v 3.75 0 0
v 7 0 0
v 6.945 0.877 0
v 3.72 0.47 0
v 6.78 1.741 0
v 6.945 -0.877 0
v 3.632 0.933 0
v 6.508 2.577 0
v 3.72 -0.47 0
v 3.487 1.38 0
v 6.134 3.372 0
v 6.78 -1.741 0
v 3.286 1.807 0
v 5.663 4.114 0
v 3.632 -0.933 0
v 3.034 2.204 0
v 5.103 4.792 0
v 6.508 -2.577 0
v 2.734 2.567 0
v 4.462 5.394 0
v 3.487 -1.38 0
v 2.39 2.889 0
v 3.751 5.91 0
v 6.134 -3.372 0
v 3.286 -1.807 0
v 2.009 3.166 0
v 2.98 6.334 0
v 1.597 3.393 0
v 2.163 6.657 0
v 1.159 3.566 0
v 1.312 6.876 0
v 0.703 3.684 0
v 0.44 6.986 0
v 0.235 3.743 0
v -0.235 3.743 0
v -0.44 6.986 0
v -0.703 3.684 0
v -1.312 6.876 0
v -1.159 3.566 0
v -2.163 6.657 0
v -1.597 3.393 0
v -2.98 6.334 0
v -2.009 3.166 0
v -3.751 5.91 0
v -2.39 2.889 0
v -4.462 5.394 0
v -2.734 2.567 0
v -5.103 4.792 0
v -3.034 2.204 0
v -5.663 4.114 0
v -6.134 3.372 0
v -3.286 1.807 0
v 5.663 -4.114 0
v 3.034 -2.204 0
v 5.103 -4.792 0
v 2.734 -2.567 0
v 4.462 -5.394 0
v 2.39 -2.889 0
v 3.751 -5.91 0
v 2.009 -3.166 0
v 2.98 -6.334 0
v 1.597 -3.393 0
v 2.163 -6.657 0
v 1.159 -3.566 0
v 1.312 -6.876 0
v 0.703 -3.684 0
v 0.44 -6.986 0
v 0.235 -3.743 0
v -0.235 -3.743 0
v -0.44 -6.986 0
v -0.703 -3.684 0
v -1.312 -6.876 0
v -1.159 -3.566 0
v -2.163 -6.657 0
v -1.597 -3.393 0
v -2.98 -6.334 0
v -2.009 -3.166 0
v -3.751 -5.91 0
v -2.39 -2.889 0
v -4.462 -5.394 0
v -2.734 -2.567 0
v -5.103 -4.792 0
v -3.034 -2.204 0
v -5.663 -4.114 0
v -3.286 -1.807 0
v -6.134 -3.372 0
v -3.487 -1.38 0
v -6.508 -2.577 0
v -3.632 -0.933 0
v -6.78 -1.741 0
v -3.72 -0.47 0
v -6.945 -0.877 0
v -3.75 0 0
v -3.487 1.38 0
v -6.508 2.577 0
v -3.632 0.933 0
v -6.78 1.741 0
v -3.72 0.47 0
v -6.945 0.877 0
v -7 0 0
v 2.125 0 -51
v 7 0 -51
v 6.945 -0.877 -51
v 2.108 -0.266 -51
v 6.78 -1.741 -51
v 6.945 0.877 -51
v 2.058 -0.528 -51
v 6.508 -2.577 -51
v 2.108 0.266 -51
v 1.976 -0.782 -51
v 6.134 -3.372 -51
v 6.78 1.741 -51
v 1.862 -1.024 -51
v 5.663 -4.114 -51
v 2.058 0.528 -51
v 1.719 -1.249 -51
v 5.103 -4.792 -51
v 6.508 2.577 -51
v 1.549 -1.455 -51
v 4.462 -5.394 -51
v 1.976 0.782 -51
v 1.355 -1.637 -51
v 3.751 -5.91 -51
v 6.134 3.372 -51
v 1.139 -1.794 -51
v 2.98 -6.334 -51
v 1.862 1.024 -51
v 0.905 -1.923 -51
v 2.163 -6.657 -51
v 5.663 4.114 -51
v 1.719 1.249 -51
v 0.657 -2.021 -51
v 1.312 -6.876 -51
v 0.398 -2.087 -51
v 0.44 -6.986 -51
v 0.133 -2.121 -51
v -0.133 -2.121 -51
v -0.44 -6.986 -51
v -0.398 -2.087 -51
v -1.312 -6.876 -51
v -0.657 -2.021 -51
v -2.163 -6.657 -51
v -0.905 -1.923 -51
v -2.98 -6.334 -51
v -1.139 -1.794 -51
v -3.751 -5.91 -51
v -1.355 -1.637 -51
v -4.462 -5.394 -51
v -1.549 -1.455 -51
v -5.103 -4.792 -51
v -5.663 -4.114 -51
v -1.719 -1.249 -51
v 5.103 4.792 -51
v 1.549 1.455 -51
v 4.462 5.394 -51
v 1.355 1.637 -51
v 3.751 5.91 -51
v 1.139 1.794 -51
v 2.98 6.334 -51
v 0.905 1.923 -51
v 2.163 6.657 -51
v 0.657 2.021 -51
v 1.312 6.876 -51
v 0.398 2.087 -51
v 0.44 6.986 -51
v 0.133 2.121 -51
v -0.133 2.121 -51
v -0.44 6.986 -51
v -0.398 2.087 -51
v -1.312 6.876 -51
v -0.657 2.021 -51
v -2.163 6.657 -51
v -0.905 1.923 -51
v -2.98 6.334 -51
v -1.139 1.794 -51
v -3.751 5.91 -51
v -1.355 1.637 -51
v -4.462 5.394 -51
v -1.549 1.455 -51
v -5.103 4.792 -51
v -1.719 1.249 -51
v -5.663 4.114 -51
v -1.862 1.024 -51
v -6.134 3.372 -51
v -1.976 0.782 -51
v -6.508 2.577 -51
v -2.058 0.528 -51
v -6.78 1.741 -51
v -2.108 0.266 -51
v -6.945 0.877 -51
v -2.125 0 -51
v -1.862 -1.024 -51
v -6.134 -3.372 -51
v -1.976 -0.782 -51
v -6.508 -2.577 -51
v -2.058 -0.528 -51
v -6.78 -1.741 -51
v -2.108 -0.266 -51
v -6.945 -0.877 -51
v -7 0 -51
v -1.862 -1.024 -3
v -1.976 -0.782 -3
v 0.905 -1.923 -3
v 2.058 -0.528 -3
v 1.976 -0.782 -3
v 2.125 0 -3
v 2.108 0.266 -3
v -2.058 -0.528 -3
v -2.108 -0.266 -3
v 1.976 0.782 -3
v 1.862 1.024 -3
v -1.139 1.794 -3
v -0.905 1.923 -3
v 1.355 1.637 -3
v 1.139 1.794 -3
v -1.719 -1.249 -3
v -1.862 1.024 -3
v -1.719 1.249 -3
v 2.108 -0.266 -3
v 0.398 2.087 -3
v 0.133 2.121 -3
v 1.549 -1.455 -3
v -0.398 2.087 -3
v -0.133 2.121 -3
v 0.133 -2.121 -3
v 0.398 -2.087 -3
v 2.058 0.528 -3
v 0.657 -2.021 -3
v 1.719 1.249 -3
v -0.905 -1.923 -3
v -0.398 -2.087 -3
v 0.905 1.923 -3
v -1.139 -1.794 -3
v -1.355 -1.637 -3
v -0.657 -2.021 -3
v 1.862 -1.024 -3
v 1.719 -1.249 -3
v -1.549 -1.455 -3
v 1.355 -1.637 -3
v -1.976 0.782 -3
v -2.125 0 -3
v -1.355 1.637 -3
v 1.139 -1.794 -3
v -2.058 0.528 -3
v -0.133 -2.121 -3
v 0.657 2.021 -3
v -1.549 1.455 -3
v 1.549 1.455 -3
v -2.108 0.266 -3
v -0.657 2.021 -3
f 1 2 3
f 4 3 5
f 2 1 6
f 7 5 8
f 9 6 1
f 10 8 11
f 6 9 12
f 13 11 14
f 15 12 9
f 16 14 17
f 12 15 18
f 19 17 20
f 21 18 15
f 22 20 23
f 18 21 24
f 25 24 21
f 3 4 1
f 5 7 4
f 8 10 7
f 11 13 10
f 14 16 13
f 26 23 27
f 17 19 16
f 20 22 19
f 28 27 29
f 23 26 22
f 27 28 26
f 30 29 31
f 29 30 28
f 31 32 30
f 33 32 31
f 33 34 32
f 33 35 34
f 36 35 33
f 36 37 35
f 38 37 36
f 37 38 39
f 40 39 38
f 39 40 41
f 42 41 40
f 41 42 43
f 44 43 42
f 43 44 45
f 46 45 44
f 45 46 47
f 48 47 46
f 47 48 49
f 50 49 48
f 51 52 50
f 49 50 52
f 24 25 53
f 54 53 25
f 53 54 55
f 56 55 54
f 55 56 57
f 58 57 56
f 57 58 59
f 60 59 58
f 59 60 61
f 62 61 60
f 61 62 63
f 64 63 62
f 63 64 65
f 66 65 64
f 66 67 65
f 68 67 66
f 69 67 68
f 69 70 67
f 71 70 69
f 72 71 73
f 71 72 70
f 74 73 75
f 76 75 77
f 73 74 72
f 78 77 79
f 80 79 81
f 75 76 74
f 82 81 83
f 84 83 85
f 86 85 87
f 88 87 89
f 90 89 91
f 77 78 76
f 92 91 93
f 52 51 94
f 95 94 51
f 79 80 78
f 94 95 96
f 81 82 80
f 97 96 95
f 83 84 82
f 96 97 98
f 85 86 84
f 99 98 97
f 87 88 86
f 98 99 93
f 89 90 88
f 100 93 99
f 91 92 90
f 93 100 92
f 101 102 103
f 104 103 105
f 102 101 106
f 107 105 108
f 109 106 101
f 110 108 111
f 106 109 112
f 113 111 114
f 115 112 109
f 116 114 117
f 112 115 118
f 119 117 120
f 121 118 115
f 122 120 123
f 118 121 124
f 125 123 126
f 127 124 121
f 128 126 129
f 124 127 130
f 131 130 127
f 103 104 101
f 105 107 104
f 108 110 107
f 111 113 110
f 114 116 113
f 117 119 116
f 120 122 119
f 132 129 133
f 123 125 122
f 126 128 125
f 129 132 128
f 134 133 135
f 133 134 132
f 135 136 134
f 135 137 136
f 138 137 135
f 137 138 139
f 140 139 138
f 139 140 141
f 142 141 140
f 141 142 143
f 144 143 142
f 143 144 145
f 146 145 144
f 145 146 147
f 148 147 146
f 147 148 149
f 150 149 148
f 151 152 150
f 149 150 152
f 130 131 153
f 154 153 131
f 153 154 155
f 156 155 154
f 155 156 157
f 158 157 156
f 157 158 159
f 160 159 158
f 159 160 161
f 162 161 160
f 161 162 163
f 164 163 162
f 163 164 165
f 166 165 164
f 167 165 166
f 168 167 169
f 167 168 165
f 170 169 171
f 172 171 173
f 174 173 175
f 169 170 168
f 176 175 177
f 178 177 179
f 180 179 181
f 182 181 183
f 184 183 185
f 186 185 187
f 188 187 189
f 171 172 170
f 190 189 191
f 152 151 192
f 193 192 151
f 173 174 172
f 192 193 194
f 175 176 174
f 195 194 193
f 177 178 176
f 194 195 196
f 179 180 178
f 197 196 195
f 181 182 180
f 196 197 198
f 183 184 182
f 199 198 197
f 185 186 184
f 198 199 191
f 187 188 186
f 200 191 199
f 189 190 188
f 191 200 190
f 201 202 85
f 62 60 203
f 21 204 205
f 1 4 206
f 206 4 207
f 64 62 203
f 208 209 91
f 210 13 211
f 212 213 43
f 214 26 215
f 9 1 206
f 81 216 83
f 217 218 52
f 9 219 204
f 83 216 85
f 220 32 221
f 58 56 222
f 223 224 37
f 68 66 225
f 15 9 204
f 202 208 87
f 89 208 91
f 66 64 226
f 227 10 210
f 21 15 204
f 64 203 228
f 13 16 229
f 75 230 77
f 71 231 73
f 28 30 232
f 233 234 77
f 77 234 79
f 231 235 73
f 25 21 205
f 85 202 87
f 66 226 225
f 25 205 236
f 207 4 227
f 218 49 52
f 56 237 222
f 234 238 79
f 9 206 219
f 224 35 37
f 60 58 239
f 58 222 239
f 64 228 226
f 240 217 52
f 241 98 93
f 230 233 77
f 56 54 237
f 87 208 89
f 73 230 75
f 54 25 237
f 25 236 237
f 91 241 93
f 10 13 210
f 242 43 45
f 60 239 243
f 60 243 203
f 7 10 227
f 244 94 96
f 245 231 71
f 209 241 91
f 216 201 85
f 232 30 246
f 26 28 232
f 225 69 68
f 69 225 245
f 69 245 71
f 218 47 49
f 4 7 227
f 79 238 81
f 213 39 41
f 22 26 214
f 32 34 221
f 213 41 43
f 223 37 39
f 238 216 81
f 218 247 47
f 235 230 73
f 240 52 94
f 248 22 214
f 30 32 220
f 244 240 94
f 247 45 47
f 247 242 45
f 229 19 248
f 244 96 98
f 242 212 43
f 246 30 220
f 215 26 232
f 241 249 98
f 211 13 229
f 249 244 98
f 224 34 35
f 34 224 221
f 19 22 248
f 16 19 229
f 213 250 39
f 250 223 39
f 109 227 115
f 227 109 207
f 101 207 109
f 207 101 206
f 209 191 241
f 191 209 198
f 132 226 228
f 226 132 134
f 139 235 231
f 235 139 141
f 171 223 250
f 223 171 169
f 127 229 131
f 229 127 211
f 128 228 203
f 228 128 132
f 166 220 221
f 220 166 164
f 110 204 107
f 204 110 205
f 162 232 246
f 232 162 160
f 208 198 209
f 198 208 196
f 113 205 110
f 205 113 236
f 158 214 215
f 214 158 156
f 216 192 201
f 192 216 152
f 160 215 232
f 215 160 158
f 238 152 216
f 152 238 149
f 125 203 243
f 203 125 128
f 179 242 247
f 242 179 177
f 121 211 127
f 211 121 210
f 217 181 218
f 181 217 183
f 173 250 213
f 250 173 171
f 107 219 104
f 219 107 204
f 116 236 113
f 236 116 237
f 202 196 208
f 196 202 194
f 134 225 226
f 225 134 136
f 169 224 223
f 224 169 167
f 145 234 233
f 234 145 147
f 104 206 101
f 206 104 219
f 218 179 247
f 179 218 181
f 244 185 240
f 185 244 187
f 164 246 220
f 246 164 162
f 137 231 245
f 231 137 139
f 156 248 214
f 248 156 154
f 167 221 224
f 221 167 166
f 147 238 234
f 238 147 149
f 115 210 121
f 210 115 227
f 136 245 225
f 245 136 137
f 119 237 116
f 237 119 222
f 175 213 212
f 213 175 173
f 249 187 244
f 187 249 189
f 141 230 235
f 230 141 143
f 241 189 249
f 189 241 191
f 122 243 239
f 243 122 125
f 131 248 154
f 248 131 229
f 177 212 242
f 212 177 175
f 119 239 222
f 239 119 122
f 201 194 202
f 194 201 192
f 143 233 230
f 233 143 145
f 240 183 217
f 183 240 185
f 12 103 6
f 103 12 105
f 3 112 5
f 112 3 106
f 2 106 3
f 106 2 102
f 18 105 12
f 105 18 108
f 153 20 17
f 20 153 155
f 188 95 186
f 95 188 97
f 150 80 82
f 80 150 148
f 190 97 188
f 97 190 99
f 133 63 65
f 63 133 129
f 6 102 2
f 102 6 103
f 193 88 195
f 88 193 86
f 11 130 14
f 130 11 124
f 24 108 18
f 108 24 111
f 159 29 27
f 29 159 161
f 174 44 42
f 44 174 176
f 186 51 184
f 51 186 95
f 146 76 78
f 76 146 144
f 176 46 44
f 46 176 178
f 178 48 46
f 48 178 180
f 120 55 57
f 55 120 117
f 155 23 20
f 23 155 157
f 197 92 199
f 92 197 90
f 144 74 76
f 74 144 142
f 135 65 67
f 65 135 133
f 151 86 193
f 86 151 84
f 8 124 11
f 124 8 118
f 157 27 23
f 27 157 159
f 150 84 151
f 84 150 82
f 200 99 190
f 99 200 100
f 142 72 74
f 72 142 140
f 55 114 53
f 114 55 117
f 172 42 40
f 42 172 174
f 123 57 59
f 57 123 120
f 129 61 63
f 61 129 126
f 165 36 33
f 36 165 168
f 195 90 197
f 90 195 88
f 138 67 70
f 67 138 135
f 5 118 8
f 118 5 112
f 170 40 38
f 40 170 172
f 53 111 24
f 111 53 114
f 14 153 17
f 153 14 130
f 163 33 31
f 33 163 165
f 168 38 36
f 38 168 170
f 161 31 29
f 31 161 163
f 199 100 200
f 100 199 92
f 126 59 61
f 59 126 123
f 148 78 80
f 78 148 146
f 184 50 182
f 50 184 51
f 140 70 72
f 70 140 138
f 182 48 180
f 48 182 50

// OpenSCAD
$fn = 50;


difference() {
	union() {
		translate(v = [0, 0, -51.0000000000]) {
			cylinder(h = 51, r = 7.0000000000);
		}
		cylinder(h = 0, r = 13.0000000000);
	}
	union() {
		translate(v = [0, 0, 0]) {
			rotate(a = [0, 0, 0]) {
				difference() {
					union() {
						#translate(v = [0, 0, -51.0000000000]) {
							cylinder(h = 51, r = 2.0000000000);
						}
						#translate(v = [0, 0, -3]) {
							cylinder(h = 3, r = 7.0000000000, r1 = 2.1250000000, r2 = 3.7500000000);
						}
						#translate(v = [0, 0, -51.0000000000]) {
							cylinder(h = 51, r = 2.1250000000);
						}
						#translate(v = [0, 0, -51.0000000000]) {
							cylinder(h = 51, r = 2.0000000000);
						}
					}
					union();
				}
			}
		}
	}
}
